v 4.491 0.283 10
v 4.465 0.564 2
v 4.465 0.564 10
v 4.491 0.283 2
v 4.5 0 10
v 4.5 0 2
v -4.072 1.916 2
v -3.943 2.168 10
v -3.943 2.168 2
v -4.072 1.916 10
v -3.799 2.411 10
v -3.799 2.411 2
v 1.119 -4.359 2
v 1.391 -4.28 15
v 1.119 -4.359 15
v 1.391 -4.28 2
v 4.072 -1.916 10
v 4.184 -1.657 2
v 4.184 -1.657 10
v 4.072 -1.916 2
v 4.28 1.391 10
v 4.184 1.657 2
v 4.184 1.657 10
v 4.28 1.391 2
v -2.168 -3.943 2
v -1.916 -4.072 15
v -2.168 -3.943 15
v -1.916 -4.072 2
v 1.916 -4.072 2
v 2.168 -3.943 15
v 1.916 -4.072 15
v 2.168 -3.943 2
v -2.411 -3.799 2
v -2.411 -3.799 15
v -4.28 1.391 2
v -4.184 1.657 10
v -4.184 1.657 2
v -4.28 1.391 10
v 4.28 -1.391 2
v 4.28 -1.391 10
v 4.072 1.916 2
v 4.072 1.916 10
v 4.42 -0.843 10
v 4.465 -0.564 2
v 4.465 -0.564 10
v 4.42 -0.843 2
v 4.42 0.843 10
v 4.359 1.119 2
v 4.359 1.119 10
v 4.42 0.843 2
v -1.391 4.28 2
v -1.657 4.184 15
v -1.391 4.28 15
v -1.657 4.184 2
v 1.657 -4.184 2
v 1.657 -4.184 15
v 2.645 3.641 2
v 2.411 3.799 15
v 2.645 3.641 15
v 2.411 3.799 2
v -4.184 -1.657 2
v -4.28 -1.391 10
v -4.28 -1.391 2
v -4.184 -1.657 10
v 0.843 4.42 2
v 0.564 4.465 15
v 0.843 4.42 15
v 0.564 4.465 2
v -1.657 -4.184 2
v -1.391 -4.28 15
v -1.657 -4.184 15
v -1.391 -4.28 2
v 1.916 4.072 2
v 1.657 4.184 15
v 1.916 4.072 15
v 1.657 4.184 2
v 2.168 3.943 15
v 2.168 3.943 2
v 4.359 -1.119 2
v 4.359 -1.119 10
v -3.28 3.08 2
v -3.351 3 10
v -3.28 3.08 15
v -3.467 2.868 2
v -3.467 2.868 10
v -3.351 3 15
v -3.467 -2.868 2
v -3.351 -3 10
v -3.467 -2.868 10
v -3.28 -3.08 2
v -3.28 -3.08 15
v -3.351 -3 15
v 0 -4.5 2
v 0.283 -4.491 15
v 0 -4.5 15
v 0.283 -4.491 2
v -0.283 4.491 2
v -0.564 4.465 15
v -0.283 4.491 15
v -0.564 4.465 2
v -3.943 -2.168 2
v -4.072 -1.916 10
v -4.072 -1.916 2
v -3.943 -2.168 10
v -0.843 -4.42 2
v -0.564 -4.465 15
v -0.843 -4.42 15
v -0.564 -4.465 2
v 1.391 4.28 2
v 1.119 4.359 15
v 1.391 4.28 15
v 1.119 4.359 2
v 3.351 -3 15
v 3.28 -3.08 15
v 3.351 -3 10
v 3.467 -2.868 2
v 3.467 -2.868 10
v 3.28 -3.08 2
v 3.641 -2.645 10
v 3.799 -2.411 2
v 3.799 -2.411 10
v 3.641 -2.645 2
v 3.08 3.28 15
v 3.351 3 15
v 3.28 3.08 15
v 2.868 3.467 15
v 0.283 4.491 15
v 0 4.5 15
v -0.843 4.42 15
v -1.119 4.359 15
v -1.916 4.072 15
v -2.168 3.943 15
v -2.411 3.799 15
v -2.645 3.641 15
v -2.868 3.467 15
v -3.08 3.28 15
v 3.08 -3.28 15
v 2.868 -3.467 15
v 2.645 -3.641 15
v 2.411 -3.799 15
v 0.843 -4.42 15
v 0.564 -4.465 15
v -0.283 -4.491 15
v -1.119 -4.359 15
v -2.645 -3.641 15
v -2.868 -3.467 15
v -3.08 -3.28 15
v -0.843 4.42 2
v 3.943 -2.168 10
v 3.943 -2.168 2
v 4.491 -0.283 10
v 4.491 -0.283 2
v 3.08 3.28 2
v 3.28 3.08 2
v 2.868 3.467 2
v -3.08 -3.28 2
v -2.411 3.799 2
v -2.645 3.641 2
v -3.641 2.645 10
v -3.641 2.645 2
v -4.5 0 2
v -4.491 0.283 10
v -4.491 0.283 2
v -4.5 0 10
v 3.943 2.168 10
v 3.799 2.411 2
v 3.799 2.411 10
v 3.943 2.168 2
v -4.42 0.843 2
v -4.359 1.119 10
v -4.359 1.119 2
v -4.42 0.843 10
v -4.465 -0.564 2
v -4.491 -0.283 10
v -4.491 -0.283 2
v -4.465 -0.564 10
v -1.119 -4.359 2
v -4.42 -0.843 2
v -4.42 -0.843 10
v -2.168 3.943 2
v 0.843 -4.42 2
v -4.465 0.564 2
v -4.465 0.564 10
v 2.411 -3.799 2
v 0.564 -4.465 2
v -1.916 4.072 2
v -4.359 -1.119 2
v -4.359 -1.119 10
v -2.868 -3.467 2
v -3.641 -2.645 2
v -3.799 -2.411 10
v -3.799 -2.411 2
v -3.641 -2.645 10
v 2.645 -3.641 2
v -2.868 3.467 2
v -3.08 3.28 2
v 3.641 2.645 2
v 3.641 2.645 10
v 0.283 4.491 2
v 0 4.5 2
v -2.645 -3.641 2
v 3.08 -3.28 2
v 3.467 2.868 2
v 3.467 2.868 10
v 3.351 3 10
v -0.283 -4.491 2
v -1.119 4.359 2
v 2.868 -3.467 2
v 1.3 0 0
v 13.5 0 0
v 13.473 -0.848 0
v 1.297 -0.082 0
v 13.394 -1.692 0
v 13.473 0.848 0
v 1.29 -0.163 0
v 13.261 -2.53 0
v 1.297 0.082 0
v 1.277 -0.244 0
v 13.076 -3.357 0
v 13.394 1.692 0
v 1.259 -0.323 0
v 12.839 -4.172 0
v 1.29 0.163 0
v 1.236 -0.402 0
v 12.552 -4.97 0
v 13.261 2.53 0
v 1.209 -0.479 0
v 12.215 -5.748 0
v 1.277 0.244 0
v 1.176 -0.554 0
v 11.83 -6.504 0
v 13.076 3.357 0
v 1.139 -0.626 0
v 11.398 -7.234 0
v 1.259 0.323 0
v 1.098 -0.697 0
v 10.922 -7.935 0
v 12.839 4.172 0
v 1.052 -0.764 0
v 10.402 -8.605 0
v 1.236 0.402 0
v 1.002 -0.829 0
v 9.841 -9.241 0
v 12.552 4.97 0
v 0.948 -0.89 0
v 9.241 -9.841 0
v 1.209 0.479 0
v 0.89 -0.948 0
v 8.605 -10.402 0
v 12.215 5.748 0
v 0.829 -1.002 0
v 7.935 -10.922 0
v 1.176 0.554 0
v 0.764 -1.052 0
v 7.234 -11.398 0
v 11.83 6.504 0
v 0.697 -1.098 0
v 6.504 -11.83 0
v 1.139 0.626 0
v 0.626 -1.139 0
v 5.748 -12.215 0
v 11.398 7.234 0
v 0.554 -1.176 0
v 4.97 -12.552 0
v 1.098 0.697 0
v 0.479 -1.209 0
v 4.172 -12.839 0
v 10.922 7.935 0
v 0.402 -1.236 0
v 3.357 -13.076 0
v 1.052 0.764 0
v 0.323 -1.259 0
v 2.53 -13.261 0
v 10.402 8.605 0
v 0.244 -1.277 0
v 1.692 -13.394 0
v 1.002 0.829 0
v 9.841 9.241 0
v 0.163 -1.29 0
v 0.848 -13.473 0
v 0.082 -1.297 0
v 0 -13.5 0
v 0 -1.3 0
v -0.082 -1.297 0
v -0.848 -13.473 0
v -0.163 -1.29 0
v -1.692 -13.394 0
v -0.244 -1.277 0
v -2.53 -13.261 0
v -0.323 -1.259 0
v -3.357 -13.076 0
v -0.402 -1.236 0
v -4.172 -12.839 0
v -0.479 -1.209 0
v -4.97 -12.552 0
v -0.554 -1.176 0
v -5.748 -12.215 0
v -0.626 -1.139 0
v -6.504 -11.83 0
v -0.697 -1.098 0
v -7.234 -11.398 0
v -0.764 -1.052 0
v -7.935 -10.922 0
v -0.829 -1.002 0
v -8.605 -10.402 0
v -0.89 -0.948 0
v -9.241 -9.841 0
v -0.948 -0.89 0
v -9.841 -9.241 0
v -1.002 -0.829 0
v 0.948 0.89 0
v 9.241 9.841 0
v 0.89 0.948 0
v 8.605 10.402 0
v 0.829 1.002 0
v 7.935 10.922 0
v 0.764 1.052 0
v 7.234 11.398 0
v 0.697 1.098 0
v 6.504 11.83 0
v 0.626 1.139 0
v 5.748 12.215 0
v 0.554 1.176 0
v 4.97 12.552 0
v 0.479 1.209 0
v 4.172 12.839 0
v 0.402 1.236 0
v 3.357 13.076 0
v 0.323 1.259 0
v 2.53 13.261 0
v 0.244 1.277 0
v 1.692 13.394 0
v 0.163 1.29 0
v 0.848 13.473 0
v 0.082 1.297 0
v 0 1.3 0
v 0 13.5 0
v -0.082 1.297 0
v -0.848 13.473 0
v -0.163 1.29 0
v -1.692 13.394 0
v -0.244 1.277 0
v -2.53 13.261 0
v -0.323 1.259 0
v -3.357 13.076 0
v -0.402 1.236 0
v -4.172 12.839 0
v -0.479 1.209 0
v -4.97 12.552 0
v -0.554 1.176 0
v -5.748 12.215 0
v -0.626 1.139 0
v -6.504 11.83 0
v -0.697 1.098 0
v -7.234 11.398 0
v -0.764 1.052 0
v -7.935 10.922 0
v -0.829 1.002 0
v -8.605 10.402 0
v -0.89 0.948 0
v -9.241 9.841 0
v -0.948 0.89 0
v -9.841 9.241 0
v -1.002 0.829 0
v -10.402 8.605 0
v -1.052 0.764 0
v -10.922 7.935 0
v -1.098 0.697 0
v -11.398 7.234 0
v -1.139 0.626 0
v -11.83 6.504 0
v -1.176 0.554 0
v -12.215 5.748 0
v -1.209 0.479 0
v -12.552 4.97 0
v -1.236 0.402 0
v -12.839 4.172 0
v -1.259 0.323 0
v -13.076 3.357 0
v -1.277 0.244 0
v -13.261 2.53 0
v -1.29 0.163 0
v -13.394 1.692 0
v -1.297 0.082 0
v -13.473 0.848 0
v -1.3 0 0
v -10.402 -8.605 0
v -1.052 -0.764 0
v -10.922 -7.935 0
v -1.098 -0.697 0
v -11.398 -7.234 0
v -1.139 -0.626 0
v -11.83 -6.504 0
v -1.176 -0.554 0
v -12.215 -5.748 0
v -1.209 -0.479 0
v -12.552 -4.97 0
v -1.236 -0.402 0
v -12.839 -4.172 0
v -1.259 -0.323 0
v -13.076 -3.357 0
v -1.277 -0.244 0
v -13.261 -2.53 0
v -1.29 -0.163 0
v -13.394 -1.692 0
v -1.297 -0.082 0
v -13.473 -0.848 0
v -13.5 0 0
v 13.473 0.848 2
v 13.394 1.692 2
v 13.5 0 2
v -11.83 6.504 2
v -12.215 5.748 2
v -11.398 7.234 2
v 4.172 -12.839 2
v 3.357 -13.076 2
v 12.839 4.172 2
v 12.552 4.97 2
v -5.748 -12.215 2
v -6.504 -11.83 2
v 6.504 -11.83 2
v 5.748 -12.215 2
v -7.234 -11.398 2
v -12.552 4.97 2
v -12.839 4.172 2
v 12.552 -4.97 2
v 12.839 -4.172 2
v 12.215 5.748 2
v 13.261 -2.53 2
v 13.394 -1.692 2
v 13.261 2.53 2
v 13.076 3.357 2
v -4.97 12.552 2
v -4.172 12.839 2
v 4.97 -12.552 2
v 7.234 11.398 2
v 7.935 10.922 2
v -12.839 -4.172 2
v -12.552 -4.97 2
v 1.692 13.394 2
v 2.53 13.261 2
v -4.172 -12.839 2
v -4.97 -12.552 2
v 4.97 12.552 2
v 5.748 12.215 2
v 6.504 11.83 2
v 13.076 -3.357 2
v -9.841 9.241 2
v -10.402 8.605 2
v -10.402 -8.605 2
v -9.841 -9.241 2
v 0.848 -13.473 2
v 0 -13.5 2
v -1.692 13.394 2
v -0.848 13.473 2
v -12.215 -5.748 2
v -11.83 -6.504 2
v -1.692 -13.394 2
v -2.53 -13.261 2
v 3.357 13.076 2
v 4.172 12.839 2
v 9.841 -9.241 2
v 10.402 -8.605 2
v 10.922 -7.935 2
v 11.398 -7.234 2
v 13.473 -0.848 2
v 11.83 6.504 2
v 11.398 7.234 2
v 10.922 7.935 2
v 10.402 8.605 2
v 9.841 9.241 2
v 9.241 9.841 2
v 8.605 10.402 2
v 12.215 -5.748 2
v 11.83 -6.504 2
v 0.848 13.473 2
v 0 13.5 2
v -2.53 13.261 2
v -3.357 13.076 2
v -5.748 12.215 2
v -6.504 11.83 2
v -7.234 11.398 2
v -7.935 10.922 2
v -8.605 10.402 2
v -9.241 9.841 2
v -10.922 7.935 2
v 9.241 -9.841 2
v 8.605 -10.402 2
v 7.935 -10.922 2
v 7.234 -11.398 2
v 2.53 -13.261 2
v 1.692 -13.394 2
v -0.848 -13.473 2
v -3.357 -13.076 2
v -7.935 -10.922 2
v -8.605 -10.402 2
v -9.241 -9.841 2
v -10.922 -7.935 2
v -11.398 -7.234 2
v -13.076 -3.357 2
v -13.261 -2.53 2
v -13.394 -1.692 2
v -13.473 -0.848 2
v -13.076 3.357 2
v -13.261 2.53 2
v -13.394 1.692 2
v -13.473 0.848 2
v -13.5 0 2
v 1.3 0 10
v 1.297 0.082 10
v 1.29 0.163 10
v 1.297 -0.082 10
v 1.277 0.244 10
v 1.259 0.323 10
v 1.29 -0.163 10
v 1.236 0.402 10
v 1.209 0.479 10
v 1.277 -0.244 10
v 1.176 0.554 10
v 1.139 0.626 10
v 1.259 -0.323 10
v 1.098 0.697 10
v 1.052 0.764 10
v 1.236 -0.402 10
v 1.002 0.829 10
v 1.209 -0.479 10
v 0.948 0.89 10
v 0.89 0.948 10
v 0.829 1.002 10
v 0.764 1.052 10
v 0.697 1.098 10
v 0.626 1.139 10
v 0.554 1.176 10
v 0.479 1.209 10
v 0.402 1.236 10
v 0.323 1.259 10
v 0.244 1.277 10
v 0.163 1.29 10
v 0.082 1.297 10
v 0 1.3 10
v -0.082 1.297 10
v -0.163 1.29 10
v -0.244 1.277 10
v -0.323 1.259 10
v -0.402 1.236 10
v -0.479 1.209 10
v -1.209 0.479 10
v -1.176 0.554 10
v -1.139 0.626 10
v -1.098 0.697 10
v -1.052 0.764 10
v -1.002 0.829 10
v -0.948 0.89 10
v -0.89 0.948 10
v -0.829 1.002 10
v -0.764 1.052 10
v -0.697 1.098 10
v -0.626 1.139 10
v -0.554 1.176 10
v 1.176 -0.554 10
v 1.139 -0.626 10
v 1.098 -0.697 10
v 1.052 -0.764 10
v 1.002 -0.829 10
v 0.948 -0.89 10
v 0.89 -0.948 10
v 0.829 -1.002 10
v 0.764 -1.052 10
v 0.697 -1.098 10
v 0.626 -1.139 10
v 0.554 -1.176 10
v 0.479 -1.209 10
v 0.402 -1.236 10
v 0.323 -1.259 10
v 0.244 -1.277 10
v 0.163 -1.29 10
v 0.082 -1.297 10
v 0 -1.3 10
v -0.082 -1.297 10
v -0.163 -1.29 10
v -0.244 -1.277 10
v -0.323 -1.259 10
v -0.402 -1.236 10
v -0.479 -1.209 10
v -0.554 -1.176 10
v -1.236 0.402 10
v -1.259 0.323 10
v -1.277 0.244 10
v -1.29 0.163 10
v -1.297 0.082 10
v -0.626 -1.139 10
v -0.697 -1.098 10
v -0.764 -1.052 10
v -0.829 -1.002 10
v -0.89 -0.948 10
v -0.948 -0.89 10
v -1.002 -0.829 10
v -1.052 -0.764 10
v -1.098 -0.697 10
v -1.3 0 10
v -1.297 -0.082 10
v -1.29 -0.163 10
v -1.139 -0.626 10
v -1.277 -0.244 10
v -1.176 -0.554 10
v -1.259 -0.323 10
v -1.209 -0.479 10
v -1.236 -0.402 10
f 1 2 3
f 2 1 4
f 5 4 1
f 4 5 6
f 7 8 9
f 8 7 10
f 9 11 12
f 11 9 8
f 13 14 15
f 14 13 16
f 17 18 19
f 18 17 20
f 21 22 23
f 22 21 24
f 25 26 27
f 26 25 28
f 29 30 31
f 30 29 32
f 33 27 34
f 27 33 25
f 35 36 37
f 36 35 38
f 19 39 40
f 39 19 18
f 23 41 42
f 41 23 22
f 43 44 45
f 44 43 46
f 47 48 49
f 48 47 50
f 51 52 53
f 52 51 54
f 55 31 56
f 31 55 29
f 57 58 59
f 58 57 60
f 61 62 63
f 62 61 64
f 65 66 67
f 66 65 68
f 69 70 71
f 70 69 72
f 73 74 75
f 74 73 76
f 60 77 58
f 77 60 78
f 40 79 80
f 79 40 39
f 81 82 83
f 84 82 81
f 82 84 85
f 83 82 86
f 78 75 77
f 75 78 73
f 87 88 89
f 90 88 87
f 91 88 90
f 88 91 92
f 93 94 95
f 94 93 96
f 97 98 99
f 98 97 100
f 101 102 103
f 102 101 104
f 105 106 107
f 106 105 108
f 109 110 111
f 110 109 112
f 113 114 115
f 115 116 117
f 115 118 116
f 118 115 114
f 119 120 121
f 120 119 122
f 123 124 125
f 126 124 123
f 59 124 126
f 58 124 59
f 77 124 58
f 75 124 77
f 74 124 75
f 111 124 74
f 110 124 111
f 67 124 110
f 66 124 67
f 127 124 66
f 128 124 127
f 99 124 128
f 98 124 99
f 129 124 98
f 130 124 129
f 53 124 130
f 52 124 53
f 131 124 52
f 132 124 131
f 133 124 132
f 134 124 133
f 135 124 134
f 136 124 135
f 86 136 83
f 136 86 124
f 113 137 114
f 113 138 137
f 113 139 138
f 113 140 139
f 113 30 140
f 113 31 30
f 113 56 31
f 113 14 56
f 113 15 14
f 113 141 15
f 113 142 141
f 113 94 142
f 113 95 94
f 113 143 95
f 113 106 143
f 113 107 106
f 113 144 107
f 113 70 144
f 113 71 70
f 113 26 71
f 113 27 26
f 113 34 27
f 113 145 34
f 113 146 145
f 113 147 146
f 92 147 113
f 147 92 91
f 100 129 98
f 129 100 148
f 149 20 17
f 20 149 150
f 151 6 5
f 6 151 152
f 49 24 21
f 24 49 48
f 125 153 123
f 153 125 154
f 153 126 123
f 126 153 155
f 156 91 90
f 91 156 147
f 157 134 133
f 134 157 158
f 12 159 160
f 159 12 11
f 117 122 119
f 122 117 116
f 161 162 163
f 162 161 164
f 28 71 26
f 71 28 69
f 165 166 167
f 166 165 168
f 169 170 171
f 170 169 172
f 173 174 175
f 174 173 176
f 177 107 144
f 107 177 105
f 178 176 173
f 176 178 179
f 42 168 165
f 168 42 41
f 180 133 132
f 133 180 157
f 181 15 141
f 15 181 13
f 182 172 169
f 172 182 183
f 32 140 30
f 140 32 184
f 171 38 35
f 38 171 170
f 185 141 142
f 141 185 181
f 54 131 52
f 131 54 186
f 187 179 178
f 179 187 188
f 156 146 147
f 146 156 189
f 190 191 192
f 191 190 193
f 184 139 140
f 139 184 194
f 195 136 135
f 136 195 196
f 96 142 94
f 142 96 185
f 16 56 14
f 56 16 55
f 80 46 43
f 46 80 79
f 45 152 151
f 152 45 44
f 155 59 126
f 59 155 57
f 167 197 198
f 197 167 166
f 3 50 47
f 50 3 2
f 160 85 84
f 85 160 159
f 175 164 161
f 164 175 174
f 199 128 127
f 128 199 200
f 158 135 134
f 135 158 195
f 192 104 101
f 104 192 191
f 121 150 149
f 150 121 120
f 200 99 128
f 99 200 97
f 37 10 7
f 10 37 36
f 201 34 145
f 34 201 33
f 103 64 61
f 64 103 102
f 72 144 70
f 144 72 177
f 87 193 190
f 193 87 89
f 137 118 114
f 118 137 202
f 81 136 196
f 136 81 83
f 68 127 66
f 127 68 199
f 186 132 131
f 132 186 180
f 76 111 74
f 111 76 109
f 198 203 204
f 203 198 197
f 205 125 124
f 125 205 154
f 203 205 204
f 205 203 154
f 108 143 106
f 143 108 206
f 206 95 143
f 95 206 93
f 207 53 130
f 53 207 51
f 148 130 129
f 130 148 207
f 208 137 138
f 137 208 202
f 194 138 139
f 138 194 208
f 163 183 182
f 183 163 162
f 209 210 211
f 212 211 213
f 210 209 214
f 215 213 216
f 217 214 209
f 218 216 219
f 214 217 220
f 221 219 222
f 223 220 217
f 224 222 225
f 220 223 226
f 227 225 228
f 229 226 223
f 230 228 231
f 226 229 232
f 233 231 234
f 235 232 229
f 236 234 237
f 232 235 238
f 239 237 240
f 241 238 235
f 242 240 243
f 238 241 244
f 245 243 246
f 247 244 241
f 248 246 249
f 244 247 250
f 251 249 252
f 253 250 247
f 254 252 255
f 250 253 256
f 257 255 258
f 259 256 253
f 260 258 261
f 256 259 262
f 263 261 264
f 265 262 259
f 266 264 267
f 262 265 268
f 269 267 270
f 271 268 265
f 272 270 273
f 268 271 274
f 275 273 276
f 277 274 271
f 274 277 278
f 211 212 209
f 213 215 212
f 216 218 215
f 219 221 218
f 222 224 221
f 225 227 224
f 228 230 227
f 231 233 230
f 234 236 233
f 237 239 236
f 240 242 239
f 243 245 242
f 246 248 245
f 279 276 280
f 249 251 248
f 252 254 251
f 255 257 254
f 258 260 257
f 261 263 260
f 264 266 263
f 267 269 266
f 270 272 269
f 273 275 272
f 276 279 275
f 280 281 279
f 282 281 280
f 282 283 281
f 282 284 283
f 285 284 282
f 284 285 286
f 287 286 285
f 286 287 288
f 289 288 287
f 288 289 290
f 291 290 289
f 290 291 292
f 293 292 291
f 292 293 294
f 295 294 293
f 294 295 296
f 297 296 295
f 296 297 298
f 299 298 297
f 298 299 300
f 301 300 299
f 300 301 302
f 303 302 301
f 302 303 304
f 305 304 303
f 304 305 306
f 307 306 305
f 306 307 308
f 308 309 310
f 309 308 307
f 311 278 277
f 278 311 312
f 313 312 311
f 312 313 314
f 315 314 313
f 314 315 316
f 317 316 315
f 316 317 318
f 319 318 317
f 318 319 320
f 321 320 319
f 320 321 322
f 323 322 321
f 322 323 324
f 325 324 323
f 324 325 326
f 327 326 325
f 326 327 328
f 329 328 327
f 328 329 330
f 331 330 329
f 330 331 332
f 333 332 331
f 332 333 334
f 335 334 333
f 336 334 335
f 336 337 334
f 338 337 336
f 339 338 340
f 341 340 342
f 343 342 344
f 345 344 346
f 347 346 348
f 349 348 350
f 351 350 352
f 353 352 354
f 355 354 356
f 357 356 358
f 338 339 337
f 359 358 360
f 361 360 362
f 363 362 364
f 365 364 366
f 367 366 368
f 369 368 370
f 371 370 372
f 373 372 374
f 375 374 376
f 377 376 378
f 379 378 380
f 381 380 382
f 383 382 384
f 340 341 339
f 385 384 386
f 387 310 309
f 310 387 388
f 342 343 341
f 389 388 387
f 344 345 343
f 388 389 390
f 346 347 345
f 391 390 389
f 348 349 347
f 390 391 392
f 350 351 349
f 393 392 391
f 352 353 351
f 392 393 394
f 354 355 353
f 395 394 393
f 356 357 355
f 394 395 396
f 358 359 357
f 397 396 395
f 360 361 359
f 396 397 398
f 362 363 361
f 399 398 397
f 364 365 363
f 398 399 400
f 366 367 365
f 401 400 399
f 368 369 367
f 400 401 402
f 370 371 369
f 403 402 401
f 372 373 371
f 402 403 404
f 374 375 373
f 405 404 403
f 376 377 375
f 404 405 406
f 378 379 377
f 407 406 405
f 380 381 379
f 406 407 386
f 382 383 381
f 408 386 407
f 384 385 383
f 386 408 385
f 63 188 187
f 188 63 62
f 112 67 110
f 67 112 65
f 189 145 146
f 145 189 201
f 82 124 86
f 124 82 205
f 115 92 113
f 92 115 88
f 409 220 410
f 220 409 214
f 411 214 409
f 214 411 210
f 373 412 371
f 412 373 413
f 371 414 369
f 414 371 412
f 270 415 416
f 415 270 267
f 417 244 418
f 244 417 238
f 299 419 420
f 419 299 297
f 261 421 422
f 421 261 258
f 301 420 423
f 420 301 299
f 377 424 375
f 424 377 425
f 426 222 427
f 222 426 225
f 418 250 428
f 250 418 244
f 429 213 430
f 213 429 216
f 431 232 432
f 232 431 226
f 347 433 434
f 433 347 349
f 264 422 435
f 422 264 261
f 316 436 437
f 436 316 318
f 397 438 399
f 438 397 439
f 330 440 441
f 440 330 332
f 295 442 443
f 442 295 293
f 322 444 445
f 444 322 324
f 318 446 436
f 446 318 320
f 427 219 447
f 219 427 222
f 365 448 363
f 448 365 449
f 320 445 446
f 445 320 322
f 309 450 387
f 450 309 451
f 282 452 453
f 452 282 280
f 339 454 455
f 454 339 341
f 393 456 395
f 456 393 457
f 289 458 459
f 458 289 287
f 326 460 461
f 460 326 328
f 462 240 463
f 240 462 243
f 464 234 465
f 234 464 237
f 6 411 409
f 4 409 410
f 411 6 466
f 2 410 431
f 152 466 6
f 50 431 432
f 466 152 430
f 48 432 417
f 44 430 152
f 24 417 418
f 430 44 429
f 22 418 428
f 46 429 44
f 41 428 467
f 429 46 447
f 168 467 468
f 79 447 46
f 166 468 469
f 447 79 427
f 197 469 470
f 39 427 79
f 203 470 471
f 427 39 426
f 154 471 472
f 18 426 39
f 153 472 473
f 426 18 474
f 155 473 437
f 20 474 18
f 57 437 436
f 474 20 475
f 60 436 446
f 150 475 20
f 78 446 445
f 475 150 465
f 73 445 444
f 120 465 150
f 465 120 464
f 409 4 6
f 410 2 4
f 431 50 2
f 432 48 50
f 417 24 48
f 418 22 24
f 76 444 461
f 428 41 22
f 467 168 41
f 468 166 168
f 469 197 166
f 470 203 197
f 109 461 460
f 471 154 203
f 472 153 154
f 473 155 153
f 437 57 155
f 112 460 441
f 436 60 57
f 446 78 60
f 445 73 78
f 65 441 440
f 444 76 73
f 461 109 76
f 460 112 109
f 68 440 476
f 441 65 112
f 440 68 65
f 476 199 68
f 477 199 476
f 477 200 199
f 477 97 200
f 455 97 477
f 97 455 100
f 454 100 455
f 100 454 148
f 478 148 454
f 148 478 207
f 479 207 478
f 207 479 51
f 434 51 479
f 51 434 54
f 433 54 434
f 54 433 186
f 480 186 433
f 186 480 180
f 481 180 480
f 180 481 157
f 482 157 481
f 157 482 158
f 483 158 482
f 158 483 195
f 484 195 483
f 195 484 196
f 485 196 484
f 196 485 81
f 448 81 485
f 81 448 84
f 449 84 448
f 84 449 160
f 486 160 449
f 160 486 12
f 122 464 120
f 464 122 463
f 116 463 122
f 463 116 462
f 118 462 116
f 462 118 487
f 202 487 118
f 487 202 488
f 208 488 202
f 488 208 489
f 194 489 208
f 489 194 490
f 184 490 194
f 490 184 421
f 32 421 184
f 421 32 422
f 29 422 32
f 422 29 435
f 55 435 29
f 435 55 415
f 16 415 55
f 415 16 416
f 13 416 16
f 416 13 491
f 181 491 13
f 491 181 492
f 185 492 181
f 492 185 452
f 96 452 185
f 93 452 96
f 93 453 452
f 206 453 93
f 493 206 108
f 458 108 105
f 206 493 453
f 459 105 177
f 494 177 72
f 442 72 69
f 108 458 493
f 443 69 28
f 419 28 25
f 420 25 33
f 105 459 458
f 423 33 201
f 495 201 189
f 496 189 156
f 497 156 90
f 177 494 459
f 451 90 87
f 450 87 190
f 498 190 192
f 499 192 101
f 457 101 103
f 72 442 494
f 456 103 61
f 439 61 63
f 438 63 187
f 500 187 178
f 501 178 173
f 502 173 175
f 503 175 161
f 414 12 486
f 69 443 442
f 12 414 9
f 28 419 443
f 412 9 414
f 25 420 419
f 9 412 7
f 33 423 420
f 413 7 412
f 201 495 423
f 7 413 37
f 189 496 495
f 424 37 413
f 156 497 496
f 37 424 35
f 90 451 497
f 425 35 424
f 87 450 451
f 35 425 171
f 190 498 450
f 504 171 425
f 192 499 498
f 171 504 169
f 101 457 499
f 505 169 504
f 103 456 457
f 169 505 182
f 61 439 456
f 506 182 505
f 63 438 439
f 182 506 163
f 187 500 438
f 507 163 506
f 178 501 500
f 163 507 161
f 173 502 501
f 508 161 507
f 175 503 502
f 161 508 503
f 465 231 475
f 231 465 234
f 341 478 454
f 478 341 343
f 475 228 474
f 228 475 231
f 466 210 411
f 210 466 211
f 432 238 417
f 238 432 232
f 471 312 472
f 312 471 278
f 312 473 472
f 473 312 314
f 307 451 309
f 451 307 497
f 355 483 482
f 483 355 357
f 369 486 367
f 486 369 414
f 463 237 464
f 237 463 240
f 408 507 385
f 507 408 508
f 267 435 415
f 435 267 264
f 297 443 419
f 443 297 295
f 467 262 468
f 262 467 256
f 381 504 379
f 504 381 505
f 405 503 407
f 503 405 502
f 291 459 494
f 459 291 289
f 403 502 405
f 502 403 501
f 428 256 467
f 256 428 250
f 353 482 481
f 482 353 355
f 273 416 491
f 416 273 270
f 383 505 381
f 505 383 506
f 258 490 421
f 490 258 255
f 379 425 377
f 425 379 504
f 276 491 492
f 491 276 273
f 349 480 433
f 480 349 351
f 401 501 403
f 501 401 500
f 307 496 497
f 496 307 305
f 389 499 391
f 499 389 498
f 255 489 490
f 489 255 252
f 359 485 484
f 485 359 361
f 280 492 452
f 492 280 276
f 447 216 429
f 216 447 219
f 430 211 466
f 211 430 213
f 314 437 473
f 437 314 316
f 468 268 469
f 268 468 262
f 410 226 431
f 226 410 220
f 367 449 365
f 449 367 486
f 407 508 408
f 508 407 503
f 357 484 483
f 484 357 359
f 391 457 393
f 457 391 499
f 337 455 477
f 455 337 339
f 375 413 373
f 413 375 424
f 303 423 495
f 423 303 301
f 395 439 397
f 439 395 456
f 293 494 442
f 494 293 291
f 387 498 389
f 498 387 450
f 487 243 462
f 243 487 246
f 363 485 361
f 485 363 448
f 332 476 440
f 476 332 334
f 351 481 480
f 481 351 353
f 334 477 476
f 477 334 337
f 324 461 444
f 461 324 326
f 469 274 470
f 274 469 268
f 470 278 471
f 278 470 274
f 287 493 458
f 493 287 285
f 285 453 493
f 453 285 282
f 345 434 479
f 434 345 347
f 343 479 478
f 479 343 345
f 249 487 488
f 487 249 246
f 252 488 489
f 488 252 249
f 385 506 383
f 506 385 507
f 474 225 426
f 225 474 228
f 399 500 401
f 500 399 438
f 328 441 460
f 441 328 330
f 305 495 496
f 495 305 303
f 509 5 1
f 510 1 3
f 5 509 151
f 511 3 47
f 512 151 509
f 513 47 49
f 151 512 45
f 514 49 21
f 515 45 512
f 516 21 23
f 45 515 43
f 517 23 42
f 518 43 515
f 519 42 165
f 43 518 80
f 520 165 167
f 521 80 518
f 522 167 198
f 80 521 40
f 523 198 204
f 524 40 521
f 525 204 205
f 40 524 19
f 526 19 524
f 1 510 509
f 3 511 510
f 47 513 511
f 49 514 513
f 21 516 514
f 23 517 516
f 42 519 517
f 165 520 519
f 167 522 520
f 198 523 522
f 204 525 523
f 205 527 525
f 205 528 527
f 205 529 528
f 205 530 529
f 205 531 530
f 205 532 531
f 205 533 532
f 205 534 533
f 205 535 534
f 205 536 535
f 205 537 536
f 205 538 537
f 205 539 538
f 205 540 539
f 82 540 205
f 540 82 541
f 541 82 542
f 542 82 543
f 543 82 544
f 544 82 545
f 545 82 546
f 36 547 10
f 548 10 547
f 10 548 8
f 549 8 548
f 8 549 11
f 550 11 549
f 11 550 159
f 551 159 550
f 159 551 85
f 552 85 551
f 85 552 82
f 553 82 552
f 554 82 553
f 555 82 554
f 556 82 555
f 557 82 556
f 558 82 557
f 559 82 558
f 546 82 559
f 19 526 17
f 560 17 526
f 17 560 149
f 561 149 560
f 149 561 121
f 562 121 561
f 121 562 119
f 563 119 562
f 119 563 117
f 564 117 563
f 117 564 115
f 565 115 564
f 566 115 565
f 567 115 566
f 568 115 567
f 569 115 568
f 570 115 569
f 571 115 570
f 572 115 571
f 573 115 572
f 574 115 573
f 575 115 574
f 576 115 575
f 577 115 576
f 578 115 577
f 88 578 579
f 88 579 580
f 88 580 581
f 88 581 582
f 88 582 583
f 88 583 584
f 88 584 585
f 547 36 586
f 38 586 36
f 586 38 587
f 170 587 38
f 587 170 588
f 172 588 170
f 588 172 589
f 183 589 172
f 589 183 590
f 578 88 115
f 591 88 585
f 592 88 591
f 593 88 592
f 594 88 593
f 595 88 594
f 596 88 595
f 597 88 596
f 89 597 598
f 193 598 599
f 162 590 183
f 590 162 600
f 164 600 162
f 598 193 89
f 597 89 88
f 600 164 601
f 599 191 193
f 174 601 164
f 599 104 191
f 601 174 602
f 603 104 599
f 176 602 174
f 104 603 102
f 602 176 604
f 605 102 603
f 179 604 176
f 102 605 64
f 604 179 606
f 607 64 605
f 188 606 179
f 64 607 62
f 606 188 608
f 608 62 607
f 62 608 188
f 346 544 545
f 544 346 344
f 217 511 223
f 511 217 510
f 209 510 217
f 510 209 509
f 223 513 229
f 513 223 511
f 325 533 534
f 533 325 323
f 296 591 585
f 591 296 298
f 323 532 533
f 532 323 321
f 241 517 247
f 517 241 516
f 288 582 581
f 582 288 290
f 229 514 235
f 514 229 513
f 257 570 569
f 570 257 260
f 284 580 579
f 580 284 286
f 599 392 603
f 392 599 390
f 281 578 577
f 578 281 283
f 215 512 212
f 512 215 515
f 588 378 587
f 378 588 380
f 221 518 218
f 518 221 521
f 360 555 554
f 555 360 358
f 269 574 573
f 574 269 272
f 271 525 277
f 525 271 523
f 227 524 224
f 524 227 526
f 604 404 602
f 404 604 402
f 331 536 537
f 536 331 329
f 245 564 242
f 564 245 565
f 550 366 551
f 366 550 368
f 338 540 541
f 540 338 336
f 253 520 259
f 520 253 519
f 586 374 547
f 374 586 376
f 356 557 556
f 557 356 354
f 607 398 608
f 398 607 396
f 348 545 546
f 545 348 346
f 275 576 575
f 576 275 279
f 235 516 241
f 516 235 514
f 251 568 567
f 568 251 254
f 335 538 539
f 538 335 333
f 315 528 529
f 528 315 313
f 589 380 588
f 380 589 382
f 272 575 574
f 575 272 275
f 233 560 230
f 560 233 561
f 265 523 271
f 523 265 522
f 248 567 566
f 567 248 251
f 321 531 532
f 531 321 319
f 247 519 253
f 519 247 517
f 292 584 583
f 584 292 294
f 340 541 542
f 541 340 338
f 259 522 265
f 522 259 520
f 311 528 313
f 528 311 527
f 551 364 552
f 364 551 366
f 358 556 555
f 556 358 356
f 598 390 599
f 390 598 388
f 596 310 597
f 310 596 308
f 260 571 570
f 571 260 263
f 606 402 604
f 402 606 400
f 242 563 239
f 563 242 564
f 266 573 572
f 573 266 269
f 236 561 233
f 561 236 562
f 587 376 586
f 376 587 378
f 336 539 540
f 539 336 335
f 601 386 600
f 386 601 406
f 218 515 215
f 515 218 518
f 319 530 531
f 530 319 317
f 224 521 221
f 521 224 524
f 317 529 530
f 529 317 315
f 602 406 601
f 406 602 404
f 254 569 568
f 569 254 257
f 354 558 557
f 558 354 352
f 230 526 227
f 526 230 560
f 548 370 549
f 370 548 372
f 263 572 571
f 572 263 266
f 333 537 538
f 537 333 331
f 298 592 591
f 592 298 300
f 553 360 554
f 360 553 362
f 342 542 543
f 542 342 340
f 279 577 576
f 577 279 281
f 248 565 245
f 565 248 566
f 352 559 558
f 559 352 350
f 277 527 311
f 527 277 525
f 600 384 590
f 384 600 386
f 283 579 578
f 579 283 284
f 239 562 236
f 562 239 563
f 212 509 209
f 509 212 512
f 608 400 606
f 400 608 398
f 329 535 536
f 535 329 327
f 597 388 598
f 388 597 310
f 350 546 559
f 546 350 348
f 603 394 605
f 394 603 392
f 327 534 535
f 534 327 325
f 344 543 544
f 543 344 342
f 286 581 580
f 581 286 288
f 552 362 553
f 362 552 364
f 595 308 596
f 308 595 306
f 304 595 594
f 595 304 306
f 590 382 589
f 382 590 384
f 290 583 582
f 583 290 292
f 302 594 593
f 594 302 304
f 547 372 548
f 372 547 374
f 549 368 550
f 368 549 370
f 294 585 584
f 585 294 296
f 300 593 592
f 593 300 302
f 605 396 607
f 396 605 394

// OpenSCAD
$fn = 100;

rad_main = 9/2;
rad_outer = rad_main * 3;
dim_outer_h = 2;
dim_main_h = 8;
rad_hole = 3.5/2;
rad_tap = 1.3;
dim_teeth_h = 5;


module base(){
	difference() {
		union(){
			cylinder(r=rad_outer,h=dim_outer_h);
			cylinder(r=rad_main,h=dim_main_h + dim_outer_h);

			difference(){
				cylinder(r=rad_main,h=dim_main_h + dim_teeth_h + dim_outer_h);
				translate([ 0, 0, dim_teeth_h * 0.5 + dim_outer_h + dim_main_h])cube([9.1, 6,dim_teeth_h + 0.1],center = true);

			}
		}
		
		cylinder(r=rad_tap,h=100, center=true);
	}
}



module top(){
	translate([ 0, 0, dim_main_h + dim_outer_h + 0.1])
	difference() {
		cylinder(r=rad_outer,h=dim_outer_h);
		translate([ 0, 3.75, 0])cube([7,1.8,dim_main_h * 4], center = true);
		translate([ 0, -3.75, 0])cube([7,1.8,dim_main_h * 4], center = true);
		cylinder(r=rad_hole,h=10, center=true);
	}
}


base();
//top();
